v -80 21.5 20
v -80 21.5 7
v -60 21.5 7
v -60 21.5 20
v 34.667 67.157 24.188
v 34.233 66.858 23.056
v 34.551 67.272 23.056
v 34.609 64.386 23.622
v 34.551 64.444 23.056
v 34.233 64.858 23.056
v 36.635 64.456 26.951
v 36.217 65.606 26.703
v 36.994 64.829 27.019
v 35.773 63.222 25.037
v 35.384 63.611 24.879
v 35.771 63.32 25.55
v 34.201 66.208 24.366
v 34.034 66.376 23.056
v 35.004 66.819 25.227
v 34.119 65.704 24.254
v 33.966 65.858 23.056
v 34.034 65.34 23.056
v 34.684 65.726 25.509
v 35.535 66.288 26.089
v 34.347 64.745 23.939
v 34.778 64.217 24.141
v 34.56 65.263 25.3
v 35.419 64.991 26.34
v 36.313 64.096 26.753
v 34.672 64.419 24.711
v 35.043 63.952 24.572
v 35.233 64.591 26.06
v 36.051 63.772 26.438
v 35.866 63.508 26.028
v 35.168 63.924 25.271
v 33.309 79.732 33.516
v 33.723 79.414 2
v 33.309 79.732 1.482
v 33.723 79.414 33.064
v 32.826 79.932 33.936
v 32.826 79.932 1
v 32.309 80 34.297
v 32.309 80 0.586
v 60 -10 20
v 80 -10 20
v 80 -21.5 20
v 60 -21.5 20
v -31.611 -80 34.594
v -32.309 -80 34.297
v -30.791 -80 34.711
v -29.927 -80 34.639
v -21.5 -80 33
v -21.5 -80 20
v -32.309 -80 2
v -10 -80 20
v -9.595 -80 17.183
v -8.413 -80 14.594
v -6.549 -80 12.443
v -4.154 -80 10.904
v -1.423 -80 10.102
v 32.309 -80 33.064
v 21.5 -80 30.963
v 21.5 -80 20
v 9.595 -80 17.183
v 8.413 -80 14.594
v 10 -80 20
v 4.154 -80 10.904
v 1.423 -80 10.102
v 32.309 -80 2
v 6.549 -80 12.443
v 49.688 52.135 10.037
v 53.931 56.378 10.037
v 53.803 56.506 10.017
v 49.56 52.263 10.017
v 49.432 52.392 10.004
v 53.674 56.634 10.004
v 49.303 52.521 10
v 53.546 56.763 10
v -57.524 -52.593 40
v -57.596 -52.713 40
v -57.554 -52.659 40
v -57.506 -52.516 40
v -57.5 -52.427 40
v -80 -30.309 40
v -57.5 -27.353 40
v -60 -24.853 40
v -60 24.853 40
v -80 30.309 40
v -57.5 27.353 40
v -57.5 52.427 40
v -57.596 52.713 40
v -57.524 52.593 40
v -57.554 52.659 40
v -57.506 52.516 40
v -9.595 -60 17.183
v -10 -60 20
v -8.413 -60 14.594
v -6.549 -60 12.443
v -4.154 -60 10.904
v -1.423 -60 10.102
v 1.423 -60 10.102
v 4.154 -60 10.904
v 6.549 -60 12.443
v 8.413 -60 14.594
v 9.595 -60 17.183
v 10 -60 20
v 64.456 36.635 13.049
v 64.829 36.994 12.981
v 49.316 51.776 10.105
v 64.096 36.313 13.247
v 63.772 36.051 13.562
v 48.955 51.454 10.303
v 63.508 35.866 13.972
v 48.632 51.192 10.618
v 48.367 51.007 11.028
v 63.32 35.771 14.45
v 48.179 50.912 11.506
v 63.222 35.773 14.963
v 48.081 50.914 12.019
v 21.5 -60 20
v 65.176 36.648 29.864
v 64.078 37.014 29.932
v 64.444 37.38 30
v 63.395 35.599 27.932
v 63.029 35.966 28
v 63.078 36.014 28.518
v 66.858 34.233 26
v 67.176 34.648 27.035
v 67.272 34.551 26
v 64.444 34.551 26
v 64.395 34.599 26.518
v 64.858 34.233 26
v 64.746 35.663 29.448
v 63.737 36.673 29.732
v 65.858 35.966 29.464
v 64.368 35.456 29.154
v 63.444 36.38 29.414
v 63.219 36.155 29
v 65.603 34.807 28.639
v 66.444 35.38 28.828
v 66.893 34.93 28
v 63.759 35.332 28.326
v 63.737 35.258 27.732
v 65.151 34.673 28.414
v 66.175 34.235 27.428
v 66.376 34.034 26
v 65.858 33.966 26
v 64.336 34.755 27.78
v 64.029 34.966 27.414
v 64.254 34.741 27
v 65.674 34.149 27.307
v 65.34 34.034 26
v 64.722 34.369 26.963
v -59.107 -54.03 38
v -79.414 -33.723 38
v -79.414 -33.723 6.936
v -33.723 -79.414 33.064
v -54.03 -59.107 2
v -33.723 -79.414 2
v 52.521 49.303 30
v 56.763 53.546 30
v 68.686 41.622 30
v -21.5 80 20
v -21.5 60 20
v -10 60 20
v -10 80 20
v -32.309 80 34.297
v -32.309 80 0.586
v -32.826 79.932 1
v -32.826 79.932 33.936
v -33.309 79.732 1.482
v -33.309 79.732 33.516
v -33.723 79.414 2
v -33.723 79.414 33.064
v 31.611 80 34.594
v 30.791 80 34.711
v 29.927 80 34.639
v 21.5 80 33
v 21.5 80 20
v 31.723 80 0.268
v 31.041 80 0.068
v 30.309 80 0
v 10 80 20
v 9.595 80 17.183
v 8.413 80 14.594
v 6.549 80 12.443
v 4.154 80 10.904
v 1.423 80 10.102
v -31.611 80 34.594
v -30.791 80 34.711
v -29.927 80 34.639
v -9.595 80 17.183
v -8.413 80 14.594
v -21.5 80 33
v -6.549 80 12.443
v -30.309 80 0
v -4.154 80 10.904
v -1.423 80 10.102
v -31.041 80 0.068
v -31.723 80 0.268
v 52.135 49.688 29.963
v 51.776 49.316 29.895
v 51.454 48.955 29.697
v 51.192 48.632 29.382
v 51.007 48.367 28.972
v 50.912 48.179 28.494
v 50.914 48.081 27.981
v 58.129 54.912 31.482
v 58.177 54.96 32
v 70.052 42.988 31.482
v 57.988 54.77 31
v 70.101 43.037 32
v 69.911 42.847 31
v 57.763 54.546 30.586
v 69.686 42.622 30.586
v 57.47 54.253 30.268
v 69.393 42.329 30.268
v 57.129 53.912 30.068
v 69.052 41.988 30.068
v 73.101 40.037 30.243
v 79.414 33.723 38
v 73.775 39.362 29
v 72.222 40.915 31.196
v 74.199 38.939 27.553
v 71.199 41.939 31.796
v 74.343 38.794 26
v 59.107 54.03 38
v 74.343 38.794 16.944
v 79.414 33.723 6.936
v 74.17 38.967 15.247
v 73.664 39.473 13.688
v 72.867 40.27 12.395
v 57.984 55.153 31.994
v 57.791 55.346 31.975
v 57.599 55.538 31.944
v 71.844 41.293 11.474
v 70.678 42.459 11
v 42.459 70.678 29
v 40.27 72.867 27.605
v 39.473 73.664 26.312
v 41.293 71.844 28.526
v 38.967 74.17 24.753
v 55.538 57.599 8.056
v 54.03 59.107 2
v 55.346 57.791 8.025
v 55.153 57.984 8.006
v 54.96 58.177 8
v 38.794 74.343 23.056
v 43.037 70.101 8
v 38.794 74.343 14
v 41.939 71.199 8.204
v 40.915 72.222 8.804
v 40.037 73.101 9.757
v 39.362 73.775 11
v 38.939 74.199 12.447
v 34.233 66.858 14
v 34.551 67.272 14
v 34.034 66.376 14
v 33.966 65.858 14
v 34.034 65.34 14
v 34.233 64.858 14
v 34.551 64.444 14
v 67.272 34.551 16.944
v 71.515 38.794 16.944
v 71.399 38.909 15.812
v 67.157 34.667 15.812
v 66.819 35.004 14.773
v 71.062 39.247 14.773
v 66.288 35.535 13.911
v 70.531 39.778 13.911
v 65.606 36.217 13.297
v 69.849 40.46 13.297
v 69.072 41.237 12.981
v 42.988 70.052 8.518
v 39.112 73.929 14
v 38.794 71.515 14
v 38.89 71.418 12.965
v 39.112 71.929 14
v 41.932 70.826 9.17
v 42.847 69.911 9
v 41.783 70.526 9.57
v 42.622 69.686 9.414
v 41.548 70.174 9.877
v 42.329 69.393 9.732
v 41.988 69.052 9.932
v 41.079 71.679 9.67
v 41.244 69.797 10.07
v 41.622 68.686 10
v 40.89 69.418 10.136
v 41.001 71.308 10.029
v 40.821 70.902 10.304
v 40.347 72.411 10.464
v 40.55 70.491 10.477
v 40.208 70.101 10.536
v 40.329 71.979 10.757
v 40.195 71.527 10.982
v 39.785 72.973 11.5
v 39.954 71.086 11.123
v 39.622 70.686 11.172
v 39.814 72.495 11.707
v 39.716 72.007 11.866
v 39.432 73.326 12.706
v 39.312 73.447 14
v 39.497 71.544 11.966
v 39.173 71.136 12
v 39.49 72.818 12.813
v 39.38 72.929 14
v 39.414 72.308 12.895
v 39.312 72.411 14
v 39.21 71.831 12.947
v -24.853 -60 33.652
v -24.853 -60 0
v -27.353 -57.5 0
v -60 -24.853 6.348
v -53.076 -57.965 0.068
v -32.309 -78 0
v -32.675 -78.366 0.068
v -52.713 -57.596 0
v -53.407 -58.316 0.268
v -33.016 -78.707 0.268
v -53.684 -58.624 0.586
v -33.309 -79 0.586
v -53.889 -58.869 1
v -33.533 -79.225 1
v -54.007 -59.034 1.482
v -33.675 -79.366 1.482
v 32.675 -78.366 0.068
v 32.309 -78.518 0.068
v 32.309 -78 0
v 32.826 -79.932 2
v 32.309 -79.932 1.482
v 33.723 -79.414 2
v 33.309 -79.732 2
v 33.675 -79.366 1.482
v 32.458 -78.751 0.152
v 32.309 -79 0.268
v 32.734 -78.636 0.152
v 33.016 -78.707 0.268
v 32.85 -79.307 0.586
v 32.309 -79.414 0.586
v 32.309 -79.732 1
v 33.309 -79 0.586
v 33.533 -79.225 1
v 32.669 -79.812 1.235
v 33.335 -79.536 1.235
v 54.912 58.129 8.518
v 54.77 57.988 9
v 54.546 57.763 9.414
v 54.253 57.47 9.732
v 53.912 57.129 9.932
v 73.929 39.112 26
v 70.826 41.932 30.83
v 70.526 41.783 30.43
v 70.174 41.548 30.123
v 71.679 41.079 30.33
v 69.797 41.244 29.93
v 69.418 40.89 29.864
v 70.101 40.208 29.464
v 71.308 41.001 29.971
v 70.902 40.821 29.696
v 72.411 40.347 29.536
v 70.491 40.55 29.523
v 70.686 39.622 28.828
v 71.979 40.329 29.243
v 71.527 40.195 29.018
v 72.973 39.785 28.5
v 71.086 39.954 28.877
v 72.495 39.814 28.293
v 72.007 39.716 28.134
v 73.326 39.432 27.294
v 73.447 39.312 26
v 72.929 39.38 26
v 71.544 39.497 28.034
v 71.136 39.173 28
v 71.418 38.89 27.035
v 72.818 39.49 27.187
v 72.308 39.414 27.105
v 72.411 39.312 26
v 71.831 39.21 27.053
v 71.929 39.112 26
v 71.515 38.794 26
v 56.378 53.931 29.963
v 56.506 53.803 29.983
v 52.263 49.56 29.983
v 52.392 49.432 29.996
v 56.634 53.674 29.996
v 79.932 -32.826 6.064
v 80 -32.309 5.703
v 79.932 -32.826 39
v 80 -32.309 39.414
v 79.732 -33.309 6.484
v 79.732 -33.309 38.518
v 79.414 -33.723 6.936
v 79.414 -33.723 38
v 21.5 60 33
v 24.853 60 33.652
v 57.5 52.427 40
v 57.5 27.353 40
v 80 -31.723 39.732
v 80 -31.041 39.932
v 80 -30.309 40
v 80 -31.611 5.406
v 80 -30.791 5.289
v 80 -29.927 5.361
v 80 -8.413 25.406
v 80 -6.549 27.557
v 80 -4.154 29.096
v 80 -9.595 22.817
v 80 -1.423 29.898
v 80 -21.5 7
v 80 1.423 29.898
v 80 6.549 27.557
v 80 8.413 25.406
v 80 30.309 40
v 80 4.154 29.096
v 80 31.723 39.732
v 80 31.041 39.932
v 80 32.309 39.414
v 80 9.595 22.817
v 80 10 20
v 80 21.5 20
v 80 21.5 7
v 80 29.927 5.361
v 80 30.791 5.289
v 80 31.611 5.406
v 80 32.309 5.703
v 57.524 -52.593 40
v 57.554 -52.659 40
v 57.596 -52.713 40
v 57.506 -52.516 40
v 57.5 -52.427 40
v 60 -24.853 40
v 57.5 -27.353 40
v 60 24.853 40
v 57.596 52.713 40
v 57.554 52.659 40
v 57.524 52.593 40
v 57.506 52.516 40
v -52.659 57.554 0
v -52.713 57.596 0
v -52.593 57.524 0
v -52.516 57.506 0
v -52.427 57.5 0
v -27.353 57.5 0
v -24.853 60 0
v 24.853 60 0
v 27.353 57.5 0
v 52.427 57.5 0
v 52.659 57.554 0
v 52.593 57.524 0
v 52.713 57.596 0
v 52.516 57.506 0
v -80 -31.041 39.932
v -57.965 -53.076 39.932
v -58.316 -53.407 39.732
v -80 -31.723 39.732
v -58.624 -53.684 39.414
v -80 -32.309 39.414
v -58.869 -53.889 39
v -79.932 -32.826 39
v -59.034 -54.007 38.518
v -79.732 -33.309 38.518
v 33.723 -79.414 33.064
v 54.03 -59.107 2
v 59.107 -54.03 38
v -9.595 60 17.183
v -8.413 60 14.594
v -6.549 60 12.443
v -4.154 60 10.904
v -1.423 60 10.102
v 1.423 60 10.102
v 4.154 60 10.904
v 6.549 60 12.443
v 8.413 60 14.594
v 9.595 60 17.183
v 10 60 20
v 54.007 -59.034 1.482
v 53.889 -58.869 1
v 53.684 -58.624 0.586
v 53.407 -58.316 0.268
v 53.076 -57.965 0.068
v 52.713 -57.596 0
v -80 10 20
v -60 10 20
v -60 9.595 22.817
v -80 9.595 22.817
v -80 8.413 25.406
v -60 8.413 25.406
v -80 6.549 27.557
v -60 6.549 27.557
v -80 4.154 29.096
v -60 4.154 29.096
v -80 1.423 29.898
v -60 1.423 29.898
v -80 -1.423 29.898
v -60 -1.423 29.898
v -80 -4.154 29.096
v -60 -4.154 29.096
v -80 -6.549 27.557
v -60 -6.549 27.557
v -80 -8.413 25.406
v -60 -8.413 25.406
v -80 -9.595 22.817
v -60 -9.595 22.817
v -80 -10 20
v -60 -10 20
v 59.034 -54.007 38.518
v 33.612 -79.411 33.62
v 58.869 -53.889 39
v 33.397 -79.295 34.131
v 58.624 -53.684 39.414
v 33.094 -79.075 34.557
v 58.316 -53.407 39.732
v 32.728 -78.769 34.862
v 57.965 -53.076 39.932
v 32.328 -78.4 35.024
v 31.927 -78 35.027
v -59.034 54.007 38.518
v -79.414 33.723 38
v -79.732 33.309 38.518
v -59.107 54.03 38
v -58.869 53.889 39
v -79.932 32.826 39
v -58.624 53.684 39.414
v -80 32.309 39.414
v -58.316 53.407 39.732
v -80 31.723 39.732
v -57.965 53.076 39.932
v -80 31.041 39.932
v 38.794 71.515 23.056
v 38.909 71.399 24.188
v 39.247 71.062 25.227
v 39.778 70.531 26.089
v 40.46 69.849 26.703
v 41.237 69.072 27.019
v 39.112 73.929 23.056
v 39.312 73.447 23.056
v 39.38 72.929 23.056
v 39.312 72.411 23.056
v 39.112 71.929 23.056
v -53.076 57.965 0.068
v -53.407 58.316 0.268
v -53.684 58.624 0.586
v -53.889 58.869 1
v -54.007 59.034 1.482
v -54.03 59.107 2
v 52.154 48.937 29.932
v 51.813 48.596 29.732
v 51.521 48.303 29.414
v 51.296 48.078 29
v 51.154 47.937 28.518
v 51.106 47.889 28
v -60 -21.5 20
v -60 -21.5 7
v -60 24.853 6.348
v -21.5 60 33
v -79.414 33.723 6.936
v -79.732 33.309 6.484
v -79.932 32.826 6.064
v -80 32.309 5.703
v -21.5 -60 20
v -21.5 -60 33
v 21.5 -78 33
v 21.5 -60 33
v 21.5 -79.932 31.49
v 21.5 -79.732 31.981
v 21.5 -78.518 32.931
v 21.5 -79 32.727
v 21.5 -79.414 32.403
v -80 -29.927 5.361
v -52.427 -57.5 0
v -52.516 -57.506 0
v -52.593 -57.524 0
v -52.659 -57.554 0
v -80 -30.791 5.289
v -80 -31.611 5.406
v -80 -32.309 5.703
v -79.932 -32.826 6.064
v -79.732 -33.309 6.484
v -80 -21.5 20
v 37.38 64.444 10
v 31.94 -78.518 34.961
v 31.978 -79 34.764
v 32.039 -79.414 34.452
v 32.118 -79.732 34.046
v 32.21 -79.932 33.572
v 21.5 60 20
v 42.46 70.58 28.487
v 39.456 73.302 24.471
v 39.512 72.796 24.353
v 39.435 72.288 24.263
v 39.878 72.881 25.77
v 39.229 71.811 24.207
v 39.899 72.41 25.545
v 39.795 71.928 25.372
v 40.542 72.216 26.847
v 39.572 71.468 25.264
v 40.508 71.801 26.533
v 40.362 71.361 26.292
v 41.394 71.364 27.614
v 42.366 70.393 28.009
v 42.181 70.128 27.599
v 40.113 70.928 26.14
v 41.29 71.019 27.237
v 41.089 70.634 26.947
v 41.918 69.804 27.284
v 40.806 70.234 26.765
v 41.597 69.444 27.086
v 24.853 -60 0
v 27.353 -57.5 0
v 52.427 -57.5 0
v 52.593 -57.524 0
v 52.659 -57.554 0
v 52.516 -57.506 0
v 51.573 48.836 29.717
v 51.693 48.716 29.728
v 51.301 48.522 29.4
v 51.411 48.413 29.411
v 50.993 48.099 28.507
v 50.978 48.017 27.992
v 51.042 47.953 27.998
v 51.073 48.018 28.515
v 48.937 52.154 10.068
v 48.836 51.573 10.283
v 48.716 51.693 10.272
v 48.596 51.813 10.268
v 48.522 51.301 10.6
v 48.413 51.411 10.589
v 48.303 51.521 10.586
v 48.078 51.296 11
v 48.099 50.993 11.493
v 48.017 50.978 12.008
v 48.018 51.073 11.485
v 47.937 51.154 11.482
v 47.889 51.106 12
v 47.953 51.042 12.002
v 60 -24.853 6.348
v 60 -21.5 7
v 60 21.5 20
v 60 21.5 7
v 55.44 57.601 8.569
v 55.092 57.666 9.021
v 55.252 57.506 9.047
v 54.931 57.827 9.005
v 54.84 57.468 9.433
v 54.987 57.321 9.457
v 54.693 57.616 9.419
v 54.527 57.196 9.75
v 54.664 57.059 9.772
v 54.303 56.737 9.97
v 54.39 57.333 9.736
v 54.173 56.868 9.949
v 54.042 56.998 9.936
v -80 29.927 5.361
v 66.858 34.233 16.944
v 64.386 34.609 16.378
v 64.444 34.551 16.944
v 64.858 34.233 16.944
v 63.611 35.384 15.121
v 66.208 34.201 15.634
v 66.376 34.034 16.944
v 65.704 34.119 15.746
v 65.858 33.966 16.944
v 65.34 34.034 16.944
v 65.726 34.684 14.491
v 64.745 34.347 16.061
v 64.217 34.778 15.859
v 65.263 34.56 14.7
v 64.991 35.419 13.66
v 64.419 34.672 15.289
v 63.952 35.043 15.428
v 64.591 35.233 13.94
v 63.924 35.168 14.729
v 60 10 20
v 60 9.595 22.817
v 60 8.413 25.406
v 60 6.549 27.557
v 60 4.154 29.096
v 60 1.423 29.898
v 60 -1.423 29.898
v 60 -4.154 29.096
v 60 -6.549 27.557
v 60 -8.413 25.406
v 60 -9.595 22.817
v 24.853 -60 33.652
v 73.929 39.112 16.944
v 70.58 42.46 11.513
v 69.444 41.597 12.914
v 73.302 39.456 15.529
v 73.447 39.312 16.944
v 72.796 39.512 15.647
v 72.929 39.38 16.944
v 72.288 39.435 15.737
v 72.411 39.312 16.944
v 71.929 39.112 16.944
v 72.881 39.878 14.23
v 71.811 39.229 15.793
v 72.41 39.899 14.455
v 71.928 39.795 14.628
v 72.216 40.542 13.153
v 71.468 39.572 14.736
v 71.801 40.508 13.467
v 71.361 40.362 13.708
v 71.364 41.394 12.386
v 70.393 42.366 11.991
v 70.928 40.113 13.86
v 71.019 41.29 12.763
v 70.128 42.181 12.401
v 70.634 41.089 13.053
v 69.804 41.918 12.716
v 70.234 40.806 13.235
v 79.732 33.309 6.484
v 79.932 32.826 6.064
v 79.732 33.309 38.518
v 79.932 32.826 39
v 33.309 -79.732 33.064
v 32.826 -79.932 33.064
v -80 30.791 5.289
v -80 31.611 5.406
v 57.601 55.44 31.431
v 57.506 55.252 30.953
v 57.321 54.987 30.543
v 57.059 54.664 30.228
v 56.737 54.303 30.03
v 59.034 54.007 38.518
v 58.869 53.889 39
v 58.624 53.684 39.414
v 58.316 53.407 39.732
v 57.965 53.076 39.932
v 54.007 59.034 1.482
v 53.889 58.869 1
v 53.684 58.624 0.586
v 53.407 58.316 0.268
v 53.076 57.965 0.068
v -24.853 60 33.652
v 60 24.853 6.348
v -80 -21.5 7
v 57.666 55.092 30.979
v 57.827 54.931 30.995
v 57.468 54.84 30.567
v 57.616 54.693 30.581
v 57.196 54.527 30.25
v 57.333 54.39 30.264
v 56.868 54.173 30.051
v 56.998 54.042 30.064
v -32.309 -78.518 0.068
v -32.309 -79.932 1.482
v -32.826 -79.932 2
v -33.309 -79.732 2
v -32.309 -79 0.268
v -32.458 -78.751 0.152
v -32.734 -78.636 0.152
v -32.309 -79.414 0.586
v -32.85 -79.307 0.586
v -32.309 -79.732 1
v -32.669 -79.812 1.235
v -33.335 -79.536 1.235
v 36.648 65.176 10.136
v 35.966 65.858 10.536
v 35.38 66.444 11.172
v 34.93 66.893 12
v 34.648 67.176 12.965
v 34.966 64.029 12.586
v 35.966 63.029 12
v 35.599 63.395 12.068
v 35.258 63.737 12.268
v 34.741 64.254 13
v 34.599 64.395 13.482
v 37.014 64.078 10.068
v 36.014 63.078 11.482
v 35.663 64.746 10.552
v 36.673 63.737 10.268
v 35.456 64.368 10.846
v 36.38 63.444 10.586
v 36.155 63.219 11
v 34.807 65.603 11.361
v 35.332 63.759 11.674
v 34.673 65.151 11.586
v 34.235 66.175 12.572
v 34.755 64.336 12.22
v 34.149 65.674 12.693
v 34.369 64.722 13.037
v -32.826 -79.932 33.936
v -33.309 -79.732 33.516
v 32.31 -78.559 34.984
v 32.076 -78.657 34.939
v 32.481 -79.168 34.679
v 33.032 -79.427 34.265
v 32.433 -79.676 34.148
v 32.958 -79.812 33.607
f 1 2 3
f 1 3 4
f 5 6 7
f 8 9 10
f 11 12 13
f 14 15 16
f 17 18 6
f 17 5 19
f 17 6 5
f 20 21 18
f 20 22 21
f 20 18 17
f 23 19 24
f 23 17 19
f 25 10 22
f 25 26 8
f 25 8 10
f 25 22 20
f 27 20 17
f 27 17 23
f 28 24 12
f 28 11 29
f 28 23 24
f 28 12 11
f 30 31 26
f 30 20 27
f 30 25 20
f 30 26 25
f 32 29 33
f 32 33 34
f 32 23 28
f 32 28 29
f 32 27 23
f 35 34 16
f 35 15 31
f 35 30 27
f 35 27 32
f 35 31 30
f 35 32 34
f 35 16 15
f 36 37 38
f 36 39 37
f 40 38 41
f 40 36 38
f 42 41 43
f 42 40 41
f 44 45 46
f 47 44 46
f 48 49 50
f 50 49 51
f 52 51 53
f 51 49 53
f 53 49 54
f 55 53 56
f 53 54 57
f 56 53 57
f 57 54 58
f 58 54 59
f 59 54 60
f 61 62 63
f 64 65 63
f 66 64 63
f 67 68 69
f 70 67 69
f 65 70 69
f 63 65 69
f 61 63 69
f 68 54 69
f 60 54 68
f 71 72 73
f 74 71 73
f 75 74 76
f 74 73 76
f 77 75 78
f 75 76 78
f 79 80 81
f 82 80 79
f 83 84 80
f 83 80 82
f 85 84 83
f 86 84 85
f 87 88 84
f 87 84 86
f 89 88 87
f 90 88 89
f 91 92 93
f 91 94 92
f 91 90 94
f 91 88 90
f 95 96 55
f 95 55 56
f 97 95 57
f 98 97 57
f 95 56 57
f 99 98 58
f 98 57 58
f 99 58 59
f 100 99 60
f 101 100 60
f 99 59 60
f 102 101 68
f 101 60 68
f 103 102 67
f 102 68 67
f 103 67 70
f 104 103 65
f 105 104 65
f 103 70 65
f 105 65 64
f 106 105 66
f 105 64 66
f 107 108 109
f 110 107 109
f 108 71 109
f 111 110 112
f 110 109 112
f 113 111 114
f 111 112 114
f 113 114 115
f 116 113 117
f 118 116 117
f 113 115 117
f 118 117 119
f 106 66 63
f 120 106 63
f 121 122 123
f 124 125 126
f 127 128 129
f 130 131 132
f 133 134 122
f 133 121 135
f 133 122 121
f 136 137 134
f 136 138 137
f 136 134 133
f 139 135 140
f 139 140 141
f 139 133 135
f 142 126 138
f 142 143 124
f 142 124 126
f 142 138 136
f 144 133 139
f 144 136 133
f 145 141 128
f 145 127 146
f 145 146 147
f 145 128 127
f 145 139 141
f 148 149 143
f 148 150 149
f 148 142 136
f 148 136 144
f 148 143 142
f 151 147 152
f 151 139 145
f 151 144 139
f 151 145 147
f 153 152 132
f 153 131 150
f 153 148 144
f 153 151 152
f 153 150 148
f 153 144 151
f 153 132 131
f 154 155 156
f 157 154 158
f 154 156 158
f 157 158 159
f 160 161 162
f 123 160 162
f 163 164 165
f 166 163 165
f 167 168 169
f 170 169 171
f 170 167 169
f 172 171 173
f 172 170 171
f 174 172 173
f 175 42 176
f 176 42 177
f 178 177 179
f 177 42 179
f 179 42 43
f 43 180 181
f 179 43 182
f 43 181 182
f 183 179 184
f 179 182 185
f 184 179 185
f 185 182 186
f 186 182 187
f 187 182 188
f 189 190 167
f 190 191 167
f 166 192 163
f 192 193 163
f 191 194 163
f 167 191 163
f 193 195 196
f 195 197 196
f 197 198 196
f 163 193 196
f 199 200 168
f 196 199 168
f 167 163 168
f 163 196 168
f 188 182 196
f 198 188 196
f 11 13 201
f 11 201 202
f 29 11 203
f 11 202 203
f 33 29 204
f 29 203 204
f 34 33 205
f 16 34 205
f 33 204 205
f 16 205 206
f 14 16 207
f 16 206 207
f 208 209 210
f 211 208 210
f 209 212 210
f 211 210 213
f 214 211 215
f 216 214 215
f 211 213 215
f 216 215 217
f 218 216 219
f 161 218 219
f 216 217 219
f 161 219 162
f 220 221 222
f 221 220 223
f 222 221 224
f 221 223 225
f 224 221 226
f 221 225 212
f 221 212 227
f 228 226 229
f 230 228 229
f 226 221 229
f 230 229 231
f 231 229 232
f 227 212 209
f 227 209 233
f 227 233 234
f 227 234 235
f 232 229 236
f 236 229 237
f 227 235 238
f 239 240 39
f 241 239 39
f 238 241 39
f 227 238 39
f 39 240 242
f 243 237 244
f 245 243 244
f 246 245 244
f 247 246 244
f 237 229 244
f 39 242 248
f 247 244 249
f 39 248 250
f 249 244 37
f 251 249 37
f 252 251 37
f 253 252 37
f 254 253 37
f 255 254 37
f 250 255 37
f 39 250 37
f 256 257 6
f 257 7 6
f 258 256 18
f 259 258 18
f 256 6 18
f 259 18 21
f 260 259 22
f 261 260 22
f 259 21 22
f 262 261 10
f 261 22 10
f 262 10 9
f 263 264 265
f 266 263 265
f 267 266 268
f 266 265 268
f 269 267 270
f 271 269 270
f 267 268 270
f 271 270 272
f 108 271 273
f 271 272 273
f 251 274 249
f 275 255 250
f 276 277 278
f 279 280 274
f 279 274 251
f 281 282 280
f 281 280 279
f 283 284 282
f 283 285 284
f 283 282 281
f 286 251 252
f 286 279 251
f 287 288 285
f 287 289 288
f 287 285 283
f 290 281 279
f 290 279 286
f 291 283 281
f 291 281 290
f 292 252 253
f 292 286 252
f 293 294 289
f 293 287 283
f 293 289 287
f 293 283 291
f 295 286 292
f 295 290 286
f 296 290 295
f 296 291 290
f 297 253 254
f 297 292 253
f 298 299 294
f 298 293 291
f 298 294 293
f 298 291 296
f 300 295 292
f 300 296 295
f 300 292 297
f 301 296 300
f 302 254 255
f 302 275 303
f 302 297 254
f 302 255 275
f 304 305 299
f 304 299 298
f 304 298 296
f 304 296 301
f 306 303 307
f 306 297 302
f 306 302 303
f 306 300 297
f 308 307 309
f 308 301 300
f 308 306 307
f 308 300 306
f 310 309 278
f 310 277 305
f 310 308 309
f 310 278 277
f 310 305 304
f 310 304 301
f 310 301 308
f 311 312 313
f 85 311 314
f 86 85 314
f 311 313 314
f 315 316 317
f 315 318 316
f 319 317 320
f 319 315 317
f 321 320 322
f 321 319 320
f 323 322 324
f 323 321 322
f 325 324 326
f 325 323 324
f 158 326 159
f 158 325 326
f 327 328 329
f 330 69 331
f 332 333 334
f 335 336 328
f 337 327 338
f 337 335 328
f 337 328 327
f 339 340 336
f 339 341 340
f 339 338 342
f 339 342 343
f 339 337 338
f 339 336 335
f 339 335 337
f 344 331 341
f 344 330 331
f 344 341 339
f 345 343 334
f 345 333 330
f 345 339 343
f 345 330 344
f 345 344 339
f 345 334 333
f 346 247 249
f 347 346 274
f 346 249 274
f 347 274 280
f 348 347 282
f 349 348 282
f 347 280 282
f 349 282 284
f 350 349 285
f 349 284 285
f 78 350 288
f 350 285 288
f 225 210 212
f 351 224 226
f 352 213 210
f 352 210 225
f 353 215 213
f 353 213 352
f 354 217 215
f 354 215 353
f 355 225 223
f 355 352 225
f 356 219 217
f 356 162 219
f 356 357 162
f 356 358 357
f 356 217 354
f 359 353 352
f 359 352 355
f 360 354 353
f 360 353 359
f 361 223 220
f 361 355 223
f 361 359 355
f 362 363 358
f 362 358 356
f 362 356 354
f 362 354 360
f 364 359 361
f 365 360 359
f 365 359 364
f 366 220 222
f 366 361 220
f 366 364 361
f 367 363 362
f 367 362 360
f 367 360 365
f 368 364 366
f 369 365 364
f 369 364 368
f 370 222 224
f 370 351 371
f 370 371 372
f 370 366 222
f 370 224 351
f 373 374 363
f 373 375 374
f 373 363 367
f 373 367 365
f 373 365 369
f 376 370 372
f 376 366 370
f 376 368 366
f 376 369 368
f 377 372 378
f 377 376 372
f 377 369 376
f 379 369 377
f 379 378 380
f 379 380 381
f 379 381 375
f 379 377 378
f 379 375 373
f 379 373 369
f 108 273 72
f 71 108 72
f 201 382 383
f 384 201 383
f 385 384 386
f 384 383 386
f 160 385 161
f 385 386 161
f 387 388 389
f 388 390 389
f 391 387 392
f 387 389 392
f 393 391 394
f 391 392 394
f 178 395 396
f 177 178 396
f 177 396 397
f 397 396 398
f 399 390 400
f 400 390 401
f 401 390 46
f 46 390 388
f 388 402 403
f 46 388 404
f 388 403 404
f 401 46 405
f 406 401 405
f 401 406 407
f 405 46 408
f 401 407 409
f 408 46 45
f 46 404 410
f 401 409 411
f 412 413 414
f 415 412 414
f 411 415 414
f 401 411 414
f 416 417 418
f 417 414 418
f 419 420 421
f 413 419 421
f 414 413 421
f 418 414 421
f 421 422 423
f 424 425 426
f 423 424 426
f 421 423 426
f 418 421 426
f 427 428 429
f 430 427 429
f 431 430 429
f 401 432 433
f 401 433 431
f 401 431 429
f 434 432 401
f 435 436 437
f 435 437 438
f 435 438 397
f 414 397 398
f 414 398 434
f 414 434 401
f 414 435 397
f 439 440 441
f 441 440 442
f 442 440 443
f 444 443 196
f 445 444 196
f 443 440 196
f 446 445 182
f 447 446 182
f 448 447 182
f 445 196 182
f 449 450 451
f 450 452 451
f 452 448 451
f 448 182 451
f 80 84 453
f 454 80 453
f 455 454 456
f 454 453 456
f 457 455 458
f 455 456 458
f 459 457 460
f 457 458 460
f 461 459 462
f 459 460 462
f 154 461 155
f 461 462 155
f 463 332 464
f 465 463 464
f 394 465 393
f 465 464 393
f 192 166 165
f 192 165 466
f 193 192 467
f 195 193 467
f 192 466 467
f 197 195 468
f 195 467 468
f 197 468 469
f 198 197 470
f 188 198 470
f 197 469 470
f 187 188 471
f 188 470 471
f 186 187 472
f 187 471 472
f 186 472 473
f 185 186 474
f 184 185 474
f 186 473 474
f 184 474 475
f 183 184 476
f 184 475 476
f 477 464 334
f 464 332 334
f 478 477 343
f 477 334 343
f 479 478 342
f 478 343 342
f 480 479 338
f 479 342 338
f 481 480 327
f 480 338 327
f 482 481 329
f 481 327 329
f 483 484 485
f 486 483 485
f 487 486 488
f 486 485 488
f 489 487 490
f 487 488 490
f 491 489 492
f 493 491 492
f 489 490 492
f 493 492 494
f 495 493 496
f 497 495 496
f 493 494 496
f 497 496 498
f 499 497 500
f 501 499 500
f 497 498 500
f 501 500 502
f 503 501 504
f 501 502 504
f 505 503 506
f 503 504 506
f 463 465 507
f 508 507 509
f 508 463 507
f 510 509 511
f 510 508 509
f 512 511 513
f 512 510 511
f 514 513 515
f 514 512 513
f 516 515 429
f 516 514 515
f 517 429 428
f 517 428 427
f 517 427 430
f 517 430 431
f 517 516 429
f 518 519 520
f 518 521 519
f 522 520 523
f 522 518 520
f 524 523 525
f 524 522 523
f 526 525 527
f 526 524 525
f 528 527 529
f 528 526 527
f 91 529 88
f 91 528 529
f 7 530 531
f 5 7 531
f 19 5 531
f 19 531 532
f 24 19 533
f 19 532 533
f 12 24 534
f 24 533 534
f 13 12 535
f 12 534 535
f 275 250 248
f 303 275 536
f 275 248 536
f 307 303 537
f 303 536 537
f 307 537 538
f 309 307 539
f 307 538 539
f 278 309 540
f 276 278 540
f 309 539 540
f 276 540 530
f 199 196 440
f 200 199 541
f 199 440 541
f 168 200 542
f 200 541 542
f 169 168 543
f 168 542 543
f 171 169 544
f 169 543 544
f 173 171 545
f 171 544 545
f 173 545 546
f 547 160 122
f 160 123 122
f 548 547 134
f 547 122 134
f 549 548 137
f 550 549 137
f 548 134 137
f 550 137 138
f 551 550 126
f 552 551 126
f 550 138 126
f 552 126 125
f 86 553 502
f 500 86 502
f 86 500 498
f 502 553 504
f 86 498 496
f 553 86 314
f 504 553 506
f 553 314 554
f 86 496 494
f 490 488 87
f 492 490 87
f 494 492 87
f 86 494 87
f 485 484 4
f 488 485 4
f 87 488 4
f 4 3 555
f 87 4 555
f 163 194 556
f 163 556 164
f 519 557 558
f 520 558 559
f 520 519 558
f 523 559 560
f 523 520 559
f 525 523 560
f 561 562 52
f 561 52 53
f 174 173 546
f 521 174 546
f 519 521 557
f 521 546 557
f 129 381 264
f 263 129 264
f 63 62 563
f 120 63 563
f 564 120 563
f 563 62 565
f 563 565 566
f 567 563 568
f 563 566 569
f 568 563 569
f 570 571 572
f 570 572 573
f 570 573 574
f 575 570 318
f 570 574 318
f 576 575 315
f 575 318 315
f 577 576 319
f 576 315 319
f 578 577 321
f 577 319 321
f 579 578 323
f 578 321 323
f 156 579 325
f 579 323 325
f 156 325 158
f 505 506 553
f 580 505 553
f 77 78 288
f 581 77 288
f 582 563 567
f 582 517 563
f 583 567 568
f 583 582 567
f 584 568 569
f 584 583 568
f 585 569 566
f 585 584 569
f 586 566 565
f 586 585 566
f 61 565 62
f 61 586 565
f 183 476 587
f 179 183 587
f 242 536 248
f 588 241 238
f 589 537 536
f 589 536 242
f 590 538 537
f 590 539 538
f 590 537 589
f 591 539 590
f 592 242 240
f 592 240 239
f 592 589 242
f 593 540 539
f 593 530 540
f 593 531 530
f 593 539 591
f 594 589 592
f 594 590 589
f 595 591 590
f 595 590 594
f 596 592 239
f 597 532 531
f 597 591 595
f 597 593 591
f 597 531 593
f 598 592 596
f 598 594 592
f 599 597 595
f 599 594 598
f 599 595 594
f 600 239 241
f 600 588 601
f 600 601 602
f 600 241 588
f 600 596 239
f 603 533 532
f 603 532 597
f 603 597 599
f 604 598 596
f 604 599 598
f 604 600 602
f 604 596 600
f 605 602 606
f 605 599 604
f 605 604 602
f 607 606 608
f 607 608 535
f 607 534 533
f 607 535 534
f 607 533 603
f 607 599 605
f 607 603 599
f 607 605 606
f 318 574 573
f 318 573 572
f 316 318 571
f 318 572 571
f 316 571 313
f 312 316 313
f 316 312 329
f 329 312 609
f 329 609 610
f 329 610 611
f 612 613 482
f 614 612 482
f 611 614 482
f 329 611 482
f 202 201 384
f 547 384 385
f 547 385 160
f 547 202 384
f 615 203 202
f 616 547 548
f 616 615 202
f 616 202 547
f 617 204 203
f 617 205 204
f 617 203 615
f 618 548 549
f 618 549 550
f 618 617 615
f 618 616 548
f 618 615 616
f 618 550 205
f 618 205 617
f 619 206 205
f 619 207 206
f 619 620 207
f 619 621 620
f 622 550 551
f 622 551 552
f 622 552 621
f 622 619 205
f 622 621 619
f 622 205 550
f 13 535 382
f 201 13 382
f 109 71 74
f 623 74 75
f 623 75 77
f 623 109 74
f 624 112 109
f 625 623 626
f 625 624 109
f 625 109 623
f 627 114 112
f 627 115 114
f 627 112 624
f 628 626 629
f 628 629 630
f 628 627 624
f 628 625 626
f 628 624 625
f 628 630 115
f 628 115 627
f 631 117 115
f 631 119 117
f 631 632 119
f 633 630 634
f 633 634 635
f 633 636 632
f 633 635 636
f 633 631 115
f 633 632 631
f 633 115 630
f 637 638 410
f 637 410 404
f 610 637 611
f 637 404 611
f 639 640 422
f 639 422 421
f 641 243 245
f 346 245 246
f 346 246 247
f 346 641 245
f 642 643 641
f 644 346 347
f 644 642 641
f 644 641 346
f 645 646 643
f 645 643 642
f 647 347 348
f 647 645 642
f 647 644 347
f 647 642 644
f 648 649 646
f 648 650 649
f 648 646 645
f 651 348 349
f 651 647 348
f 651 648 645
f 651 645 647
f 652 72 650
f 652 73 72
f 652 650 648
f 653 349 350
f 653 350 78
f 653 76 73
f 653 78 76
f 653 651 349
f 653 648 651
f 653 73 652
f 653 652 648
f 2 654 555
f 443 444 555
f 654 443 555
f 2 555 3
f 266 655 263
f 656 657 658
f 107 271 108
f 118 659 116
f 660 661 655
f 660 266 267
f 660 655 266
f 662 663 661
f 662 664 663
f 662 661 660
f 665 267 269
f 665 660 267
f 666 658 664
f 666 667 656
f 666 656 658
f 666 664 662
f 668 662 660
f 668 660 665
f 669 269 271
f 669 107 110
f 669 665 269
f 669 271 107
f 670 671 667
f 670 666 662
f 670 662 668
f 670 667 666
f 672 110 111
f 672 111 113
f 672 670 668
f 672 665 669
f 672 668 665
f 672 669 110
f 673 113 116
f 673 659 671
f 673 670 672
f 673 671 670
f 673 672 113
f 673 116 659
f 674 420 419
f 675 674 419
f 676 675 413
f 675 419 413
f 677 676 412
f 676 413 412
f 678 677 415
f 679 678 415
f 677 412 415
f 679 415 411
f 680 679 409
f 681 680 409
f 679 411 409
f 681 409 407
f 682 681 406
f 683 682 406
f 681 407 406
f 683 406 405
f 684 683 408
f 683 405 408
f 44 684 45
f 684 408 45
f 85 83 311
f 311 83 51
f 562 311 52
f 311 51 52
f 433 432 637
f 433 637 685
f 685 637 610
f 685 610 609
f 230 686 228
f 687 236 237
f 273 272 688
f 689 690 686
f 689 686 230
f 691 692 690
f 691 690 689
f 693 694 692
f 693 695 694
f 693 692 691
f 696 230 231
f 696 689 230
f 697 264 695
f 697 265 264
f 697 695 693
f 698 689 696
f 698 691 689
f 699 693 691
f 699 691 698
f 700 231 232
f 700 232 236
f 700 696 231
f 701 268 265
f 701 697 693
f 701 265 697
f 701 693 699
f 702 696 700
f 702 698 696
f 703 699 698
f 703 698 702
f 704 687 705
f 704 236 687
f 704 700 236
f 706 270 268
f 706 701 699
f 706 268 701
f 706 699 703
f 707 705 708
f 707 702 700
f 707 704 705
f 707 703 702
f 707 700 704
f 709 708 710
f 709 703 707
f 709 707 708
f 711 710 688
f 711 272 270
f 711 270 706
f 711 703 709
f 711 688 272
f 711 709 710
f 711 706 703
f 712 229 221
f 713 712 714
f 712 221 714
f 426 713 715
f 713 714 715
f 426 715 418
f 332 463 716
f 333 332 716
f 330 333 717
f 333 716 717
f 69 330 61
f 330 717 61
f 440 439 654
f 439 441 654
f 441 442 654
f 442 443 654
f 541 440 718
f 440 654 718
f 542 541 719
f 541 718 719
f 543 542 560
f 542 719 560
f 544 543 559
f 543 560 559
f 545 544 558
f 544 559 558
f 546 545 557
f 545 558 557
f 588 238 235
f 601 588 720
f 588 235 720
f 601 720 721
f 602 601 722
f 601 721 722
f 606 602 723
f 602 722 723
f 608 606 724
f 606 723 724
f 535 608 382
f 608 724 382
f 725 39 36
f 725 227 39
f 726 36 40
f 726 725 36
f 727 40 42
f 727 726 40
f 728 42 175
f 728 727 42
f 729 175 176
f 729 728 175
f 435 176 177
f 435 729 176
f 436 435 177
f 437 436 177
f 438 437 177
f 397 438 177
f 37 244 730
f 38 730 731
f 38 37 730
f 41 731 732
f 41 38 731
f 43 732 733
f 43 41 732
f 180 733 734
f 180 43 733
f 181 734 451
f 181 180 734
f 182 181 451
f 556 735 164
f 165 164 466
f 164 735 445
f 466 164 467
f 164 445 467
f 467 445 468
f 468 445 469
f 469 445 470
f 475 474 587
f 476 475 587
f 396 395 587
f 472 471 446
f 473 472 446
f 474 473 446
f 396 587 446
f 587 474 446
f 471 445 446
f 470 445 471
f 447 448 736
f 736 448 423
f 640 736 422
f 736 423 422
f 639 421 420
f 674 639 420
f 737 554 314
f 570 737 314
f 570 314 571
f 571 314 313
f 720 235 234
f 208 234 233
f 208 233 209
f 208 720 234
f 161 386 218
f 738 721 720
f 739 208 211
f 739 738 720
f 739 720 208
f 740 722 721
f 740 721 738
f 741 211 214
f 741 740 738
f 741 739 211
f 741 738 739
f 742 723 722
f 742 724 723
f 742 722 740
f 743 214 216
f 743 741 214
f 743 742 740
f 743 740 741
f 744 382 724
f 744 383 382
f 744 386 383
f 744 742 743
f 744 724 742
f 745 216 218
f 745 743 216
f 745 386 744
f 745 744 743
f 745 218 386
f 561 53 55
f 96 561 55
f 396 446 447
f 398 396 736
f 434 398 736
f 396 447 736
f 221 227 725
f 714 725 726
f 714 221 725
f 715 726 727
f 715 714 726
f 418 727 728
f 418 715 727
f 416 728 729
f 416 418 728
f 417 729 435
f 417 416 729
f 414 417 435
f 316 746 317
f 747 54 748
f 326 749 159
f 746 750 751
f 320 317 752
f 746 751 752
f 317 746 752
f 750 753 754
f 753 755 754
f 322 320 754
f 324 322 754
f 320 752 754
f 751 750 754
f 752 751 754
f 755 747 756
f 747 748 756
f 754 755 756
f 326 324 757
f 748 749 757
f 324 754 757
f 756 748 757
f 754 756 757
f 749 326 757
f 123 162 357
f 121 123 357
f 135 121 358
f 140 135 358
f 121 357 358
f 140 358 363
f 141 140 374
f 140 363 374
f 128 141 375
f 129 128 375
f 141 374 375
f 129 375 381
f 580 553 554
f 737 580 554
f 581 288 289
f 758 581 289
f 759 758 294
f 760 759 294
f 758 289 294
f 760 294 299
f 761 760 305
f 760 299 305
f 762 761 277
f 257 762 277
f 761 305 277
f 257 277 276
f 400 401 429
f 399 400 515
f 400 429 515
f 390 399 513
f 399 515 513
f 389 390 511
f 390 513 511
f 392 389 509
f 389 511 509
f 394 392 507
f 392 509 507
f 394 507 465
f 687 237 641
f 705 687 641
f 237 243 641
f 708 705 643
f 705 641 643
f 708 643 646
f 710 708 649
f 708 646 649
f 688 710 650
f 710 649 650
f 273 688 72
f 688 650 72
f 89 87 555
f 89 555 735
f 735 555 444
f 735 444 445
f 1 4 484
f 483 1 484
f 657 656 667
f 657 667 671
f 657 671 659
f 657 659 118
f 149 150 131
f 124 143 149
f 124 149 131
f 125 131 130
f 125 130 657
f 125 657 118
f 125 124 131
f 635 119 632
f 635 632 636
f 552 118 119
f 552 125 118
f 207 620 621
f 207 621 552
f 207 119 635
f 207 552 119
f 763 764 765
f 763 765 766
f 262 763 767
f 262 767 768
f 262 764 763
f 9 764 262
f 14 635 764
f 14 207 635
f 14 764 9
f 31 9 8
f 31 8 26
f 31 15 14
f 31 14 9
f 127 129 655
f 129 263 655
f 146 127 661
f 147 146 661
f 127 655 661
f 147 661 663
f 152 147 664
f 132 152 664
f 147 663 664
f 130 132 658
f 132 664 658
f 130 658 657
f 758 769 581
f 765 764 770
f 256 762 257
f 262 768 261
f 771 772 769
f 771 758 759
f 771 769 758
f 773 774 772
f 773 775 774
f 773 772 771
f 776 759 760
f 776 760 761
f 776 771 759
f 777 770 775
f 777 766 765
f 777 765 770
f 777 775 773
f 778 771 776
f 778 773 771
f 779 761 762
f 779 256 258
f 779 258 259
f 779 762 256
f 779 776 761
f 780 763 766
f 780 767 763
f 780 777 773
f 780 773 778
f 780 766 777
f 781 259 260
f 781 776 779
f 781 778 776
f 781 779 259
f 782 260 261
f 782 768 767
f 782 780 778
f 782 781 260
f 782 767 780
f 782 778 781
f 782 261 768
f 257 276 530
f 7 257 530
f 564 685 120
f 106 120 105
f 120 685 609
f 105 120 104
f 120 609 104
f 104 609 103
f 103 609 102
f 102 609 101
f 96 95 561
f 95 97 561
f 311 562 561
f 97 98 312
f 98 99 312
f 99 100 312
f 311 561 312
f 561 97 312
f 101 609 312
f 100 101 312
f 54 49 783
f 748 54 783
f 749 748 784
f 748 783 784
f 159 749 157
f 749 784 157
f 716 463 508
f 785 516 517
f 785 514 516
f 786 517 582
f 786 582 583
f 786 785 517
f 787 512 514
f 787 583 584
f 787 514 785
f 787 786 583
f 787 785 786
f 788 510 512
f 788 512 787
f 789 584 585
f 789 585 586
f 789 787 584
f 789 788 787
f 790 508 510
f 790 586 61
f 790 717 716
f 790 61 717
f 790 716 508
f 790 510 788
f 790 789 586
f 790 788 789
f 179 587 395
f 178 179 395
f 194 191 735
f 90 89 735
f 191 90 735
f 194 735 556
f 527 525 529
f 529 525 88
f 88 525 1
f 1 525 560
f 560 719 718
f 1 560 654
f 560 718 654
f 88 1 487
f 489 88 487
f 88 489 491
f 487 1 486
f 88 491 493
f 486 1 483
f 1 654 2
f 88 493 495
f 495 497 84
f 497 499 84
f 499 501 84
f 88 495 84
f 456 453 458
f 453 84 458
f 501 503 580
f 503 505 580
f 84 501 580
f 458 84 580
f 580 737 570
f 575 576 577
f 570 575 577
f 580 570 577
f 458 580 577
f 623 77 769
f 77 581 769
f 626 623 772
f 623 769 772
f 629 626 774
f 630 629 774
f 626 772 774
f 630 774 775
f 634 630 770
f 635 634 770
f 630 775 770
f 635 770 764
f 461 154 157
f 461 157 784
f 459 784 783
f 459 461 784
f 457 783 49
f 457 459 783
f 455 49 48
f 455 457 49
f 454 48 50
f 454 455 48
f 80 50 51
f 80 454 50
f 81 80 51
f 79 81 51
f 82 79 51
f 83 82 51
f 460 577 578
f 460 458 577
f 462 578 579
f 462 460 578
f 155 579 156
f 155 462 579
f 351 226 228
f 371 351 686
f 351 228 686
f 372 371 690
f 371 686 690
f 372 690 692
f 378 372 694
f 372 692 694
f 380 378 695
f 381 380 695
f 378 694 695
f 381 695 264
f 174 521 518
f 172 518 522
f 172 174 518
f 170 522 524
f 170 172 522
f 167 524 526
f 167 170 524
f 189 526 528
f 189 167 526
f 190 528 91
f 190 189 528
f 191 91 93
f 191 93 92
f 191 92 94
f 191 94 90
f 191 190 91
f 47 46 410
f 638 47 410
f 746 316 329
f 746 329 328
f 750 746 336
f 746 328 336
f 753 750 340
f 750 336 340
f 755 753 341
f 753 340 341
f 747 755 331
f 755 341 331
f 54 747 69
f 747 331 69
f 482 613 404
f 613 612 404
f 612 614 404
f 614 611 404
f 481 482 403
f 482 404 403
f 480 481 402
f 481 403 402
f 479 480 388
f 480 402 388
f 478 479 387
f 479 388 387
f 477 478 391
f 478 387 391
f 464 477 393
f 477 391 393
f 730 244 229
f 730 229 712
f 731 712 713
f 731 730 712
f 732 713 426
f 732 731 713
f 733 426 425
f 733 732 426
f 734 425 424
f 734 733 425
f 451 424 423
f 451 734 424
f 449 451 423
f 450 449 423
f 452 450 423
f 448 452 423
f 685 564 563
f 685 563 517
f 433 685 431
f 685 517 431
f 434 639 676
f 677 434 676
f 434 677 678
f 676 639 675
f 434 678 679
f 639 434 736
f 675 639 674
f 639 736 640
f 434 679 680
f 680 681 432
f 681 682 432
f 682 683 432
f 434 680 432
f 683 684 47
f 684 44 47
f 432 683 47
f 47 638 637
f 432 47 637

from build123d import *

# Parameters (mm, degrees)
F1_DEPTH      = 40
F2_R          = 10
F3_DEPTH      = 180
F3_DEPTH_BACK = 20
F4_R          = 10
F5_DEPTH      = 20
F5_DEPTH_BACK = 180
F7_DEPTH      = 181.4
F9_DEPTH      = 244.2
F11_DEPTH     = 10
F12_R         = 2
F13_R         = 2


# Not quite as in the source:
# - a feature names something its author has since deleted; it is built from what else it names


with BuildPart() as f1:
    # F0 (on Top) → F1 (new body)
    with BuildSketch(Plane.XY):
        Polygon((-33.1370849898, -80), (33.1370849898, -80), (80, -33.1370849898), (80, 33.1370849898), (33.1370849898, 80), (-33.1370849898, 80), (-80, 33.1370849898), (-80, -33.1370849898), align=None)
        Polygon((60, -24.8528137424), (24.8528137424, -60), (-24.8528137424, -60), (-60, -24.8528137424), (-60, 24.8528137424), (-24.8528137424, 60), (24.8528137424, 60), (60, 24.8528137424), align=None, mode=Mode.SUBTRACT)
    extrude(amount=F1_DEPTH)

    # F2 (on face) → F3 (cut, two sides)
    with BuildSketch(Plane.XZ.offset(80)) as f3_sk:
        with Locations((0, 20)):
            Circle(F2_R)
    extrude(amount=-F3_DEPTH, mode=Mode.SUBTRACT)
    extrude(f3_sk.sketch, amount=F3_DEPTH_BACK, mode=Mode.SUBTRACT)

    # F4 (on face) → F5 (cut, two sides)
    with BuildSketch(Plane.YZ.offset(80)) as f5_sk:
        with Locations((0, 20)):
            Circle(F4_R)
    extrude(amount=F5_DEPTH, mode=Mode.SUBTRACT)
    extrude(f5_sk.sketch, amount=-F5_DEPTH_BACK, mode=Mode.SUBTRACT)

    # F6 (on face) → F7 (cut)
    with BuildSketch(Plane.XZ.offset(80)):
        Polygon((-33.1370849898, 40), (0, 40), (0, 51.6958795488), (-57.5, 51.6958795488), (-71.9271823764, 52.9654417948), (-71.9271823764, 40), (-57.5, 40), (-33.1370849898, 35.2627665258), align=None)
        with BuildLine():
            Line((0, 40), (0, 30))
            ThreePointArc((0, 30), (7.0710678119, 27.0710678119), (10, 20))
            Line((10, 20), (21.5, 20))
            Line((21.5, 20), (21.5, 33))
            Line((21.5, 33), (33.1370849898, 35.2627665258))
            Line((33.1370849898, 35.2627665258), (33.1370849898, 40))
            Line((33.1370849898, 40), (0, 40))
        make_face()
        Polygon((0, 51.6958795488), (0, 40), (33.1370849898, 40), (33.1370849898, 35.2627665258), (57.5, 40), (71.9271823764, 40), (71.9271823764, 52.9654417948), (57.5, 51.6958795488), align=None)
        with BuildLine():
            Line((-21.5, 20), (-10, 20))
            ThreePointArc((-10, 20), (-7.0710678119, 27.0710678119), (0, 30))
            Line((0, 30), (0, 40))
            Line((0, 40), (-33.1370849898, 40))
            Line((-33.1370849898, 40), (-33.1370849898, 35.2627665258))
            Line((-33.1370849898, 35.2627665258), (-21.5, 33))
            Line((-21.5, 33), (-21.5, 20))
        make_face()
    extrude(amount=-F7_DEPTH, mode=Mode.SUBTRACT)

    # F8 (on face) → F9 (cut)
    with BuildSketch(Plane.YZ.offset(80)):
        Polygon((33.1370849898, 0), (0, 0), (0, -11.1064584926), (57.5, -11.1064584926), (66.6687613726, -11.8878306821), (66.6687613726, 0), (57.5, 0), (33.1370849898, 4.7372334742), align=None)
        with BuildLine():
            ThreePointArc((10, 20), (7.0710678119, 12.9289321881), (0, 10))
            Line((0, 10), (0, 0))
            Line((0, 0), (33.1370849898, 0))
            Line((33.1370849898, 0), (33.1370849898, 4.7372334742))
            Line((33.1370849898, 4.7372334742), (21.5, 7))
            Line((21.5, 7), (21.5, 20))
            Line((21.5, 20), (10, 20))
        make_face()
        with BuildLine():
            ThreePointArc((0, 10), (-7.0710678119, 12.9289321881), (-10, 20))
            Line((-10, 20), (-21.5, 20))
            Line((-21.5, 20), (-21.5, 7))
            Line((-21.5, 7), (-33.1370849898, 4.7372334742))
            Line((-33.1370849898, 4.7372334742), (-33.1370849898, 0))
            Line((-33.1370849898, 0), (0, 0))
            Line((0, 0), (0, 10))
        make_face()
        Polygon((0, -11.1064584926), (0, 0), (-33.1370849898, 0), (-33.1370849898, 4.7372334742), (-57.5, 0), (-66.6687613726, 0), (-66.6687613726, -11.8878306821), (-57.5, -11.1064584926), align=None)
    extrude(amount=-F9_DEPTH, mode=Mode.SUBTRACT)

    # F10 (on face) → F11 (cut)
    with BuildSketch(Plane(origin=(56.5685424949, 56.5685424949, 0), x_dir=(-0.7071067812, 0.7071067812, 0), z_dir=(0.7071067812, 0.7071067812, 0))):
        with BuildLine():
            Line((-19.68193107, 12.9813232565), (1.7303785257, 10.0372808895))
            ThreePointArc((1.7303785257, 10.0372808895), (2.0021645777, 10.0093311061), (2.2752246058, 10))
            Line((2.2752246058, 10), (19.1370849898, 10))
            ThreePointArc((19.1370849898, 10), (21.9655121146, 11.1715728753), (23.1370849898, 14))
            Line((23.1370849898, 14), (23.1370849898, 23.055957633))
            ThreePointArc((23.1370849898, 23.055957633), (22.1519966238, 25.6847040718), (19.68193107, 27.0186767435))
            Line((19.68193107, 27.0186767435), (-1.7303785257, 29.9627191105))
            ThreePointArc((-1.7303785257, 29.9627191105), (-2.0021645777, 29.9906688939), (-2.2752246058, 30))
            Line((-2.2752246058, 30), (-19.1370849898, 30))
            ThreePointArc((-19.1370849898, 30), (-21.9655121146, 28.8284271247), (-23.1370849898, 26))
            Line((-23.1370849898, 26), (-23.1370849898, 16.944042367))
            ThreePointArc((-23.1370849898, 16.944042367), (-22.1519966238, 14.3152959282), (-19.68193107, 12.9813232565))
        make_face()
    extrude(amount=-F11_DEPTH, mode=Mode.SUBTRACT)

    # F12
    f12_edges = [f1.edges().sort_by_distance(p)[0] for p in [
        (33.137085, 65.857864, 18.527979),
        (33.965512, 65.029437, 11.171573),
        (41.92708, 57.067869, 10),
    ]]
    fillet(f12_edges, radius=F12_R)

    # F13
    f13_edges = [f1.edges().sort_by_distance(p)[0] for p in [
        (44.387085, 68.75, 0),
        (67.818542, 45.318542, 2.368617),
        (33.137085, 80, 17.631383),
        (45.318542, 67.818542, 37.631383),
        (80, 33.137085, 22.368617),
        (68.75, 44.387085, 40),
        (72.100505, 41.03658, 28.828427),
        (64.138937, 48.998148, 30),
        (57.984287, 55.152798, 29.990669),
        (50.22171, 62.915375, 28.490698),
        (40.904715, 72.23237, 25.684704),
        (40.208153, 72.928932, 18.527979),
        (41.03658, 72.100505, 11.171573),
        (48.998148, 64.138937, 10),
        (55.152798, 57.984287, 10.009331),
        (62.915375, 50.22171, 11.509302),
        (72.23237, 40.904715, 14.315296),
        (72.928932, 40.208153, 21.472021),
        (44.387085, -68.75, 0),
        (33.137085, -80, 17.631383),
        (45.318542, -67.818542, 37.631383),
        (68.75, -44.387085, 40),
        (80, -33.137085, 22.368617),
        (67.818542, -45.318542, 2.368617),
        (0, -80, 0),
        (27.318542, -80, 34.131383),
        (-44.387085, -68.75, 0),
        (-67.818542, -45.318542, 2.368617),
        (-80, -33.137085, 22.368617),
        (-68.75, -44.387085, 40),
        (-45.318542, -67.818542, 37.631383),
        (-33.137085, -80, 17.631383),
        (-44.387085, 68.75, 0),
        (-33.137085, 80, 17.631383),
        (-45.318542, 67.818542, 37.631383),
        (-68.75, 44.387085, 40),
        (-80, 33.137085, 22.368617),
        (-67.818542, 45.318542, 2.368617),
    ]]
    fillet(f13_edges, radius=F13_R)


solid = f1.part
